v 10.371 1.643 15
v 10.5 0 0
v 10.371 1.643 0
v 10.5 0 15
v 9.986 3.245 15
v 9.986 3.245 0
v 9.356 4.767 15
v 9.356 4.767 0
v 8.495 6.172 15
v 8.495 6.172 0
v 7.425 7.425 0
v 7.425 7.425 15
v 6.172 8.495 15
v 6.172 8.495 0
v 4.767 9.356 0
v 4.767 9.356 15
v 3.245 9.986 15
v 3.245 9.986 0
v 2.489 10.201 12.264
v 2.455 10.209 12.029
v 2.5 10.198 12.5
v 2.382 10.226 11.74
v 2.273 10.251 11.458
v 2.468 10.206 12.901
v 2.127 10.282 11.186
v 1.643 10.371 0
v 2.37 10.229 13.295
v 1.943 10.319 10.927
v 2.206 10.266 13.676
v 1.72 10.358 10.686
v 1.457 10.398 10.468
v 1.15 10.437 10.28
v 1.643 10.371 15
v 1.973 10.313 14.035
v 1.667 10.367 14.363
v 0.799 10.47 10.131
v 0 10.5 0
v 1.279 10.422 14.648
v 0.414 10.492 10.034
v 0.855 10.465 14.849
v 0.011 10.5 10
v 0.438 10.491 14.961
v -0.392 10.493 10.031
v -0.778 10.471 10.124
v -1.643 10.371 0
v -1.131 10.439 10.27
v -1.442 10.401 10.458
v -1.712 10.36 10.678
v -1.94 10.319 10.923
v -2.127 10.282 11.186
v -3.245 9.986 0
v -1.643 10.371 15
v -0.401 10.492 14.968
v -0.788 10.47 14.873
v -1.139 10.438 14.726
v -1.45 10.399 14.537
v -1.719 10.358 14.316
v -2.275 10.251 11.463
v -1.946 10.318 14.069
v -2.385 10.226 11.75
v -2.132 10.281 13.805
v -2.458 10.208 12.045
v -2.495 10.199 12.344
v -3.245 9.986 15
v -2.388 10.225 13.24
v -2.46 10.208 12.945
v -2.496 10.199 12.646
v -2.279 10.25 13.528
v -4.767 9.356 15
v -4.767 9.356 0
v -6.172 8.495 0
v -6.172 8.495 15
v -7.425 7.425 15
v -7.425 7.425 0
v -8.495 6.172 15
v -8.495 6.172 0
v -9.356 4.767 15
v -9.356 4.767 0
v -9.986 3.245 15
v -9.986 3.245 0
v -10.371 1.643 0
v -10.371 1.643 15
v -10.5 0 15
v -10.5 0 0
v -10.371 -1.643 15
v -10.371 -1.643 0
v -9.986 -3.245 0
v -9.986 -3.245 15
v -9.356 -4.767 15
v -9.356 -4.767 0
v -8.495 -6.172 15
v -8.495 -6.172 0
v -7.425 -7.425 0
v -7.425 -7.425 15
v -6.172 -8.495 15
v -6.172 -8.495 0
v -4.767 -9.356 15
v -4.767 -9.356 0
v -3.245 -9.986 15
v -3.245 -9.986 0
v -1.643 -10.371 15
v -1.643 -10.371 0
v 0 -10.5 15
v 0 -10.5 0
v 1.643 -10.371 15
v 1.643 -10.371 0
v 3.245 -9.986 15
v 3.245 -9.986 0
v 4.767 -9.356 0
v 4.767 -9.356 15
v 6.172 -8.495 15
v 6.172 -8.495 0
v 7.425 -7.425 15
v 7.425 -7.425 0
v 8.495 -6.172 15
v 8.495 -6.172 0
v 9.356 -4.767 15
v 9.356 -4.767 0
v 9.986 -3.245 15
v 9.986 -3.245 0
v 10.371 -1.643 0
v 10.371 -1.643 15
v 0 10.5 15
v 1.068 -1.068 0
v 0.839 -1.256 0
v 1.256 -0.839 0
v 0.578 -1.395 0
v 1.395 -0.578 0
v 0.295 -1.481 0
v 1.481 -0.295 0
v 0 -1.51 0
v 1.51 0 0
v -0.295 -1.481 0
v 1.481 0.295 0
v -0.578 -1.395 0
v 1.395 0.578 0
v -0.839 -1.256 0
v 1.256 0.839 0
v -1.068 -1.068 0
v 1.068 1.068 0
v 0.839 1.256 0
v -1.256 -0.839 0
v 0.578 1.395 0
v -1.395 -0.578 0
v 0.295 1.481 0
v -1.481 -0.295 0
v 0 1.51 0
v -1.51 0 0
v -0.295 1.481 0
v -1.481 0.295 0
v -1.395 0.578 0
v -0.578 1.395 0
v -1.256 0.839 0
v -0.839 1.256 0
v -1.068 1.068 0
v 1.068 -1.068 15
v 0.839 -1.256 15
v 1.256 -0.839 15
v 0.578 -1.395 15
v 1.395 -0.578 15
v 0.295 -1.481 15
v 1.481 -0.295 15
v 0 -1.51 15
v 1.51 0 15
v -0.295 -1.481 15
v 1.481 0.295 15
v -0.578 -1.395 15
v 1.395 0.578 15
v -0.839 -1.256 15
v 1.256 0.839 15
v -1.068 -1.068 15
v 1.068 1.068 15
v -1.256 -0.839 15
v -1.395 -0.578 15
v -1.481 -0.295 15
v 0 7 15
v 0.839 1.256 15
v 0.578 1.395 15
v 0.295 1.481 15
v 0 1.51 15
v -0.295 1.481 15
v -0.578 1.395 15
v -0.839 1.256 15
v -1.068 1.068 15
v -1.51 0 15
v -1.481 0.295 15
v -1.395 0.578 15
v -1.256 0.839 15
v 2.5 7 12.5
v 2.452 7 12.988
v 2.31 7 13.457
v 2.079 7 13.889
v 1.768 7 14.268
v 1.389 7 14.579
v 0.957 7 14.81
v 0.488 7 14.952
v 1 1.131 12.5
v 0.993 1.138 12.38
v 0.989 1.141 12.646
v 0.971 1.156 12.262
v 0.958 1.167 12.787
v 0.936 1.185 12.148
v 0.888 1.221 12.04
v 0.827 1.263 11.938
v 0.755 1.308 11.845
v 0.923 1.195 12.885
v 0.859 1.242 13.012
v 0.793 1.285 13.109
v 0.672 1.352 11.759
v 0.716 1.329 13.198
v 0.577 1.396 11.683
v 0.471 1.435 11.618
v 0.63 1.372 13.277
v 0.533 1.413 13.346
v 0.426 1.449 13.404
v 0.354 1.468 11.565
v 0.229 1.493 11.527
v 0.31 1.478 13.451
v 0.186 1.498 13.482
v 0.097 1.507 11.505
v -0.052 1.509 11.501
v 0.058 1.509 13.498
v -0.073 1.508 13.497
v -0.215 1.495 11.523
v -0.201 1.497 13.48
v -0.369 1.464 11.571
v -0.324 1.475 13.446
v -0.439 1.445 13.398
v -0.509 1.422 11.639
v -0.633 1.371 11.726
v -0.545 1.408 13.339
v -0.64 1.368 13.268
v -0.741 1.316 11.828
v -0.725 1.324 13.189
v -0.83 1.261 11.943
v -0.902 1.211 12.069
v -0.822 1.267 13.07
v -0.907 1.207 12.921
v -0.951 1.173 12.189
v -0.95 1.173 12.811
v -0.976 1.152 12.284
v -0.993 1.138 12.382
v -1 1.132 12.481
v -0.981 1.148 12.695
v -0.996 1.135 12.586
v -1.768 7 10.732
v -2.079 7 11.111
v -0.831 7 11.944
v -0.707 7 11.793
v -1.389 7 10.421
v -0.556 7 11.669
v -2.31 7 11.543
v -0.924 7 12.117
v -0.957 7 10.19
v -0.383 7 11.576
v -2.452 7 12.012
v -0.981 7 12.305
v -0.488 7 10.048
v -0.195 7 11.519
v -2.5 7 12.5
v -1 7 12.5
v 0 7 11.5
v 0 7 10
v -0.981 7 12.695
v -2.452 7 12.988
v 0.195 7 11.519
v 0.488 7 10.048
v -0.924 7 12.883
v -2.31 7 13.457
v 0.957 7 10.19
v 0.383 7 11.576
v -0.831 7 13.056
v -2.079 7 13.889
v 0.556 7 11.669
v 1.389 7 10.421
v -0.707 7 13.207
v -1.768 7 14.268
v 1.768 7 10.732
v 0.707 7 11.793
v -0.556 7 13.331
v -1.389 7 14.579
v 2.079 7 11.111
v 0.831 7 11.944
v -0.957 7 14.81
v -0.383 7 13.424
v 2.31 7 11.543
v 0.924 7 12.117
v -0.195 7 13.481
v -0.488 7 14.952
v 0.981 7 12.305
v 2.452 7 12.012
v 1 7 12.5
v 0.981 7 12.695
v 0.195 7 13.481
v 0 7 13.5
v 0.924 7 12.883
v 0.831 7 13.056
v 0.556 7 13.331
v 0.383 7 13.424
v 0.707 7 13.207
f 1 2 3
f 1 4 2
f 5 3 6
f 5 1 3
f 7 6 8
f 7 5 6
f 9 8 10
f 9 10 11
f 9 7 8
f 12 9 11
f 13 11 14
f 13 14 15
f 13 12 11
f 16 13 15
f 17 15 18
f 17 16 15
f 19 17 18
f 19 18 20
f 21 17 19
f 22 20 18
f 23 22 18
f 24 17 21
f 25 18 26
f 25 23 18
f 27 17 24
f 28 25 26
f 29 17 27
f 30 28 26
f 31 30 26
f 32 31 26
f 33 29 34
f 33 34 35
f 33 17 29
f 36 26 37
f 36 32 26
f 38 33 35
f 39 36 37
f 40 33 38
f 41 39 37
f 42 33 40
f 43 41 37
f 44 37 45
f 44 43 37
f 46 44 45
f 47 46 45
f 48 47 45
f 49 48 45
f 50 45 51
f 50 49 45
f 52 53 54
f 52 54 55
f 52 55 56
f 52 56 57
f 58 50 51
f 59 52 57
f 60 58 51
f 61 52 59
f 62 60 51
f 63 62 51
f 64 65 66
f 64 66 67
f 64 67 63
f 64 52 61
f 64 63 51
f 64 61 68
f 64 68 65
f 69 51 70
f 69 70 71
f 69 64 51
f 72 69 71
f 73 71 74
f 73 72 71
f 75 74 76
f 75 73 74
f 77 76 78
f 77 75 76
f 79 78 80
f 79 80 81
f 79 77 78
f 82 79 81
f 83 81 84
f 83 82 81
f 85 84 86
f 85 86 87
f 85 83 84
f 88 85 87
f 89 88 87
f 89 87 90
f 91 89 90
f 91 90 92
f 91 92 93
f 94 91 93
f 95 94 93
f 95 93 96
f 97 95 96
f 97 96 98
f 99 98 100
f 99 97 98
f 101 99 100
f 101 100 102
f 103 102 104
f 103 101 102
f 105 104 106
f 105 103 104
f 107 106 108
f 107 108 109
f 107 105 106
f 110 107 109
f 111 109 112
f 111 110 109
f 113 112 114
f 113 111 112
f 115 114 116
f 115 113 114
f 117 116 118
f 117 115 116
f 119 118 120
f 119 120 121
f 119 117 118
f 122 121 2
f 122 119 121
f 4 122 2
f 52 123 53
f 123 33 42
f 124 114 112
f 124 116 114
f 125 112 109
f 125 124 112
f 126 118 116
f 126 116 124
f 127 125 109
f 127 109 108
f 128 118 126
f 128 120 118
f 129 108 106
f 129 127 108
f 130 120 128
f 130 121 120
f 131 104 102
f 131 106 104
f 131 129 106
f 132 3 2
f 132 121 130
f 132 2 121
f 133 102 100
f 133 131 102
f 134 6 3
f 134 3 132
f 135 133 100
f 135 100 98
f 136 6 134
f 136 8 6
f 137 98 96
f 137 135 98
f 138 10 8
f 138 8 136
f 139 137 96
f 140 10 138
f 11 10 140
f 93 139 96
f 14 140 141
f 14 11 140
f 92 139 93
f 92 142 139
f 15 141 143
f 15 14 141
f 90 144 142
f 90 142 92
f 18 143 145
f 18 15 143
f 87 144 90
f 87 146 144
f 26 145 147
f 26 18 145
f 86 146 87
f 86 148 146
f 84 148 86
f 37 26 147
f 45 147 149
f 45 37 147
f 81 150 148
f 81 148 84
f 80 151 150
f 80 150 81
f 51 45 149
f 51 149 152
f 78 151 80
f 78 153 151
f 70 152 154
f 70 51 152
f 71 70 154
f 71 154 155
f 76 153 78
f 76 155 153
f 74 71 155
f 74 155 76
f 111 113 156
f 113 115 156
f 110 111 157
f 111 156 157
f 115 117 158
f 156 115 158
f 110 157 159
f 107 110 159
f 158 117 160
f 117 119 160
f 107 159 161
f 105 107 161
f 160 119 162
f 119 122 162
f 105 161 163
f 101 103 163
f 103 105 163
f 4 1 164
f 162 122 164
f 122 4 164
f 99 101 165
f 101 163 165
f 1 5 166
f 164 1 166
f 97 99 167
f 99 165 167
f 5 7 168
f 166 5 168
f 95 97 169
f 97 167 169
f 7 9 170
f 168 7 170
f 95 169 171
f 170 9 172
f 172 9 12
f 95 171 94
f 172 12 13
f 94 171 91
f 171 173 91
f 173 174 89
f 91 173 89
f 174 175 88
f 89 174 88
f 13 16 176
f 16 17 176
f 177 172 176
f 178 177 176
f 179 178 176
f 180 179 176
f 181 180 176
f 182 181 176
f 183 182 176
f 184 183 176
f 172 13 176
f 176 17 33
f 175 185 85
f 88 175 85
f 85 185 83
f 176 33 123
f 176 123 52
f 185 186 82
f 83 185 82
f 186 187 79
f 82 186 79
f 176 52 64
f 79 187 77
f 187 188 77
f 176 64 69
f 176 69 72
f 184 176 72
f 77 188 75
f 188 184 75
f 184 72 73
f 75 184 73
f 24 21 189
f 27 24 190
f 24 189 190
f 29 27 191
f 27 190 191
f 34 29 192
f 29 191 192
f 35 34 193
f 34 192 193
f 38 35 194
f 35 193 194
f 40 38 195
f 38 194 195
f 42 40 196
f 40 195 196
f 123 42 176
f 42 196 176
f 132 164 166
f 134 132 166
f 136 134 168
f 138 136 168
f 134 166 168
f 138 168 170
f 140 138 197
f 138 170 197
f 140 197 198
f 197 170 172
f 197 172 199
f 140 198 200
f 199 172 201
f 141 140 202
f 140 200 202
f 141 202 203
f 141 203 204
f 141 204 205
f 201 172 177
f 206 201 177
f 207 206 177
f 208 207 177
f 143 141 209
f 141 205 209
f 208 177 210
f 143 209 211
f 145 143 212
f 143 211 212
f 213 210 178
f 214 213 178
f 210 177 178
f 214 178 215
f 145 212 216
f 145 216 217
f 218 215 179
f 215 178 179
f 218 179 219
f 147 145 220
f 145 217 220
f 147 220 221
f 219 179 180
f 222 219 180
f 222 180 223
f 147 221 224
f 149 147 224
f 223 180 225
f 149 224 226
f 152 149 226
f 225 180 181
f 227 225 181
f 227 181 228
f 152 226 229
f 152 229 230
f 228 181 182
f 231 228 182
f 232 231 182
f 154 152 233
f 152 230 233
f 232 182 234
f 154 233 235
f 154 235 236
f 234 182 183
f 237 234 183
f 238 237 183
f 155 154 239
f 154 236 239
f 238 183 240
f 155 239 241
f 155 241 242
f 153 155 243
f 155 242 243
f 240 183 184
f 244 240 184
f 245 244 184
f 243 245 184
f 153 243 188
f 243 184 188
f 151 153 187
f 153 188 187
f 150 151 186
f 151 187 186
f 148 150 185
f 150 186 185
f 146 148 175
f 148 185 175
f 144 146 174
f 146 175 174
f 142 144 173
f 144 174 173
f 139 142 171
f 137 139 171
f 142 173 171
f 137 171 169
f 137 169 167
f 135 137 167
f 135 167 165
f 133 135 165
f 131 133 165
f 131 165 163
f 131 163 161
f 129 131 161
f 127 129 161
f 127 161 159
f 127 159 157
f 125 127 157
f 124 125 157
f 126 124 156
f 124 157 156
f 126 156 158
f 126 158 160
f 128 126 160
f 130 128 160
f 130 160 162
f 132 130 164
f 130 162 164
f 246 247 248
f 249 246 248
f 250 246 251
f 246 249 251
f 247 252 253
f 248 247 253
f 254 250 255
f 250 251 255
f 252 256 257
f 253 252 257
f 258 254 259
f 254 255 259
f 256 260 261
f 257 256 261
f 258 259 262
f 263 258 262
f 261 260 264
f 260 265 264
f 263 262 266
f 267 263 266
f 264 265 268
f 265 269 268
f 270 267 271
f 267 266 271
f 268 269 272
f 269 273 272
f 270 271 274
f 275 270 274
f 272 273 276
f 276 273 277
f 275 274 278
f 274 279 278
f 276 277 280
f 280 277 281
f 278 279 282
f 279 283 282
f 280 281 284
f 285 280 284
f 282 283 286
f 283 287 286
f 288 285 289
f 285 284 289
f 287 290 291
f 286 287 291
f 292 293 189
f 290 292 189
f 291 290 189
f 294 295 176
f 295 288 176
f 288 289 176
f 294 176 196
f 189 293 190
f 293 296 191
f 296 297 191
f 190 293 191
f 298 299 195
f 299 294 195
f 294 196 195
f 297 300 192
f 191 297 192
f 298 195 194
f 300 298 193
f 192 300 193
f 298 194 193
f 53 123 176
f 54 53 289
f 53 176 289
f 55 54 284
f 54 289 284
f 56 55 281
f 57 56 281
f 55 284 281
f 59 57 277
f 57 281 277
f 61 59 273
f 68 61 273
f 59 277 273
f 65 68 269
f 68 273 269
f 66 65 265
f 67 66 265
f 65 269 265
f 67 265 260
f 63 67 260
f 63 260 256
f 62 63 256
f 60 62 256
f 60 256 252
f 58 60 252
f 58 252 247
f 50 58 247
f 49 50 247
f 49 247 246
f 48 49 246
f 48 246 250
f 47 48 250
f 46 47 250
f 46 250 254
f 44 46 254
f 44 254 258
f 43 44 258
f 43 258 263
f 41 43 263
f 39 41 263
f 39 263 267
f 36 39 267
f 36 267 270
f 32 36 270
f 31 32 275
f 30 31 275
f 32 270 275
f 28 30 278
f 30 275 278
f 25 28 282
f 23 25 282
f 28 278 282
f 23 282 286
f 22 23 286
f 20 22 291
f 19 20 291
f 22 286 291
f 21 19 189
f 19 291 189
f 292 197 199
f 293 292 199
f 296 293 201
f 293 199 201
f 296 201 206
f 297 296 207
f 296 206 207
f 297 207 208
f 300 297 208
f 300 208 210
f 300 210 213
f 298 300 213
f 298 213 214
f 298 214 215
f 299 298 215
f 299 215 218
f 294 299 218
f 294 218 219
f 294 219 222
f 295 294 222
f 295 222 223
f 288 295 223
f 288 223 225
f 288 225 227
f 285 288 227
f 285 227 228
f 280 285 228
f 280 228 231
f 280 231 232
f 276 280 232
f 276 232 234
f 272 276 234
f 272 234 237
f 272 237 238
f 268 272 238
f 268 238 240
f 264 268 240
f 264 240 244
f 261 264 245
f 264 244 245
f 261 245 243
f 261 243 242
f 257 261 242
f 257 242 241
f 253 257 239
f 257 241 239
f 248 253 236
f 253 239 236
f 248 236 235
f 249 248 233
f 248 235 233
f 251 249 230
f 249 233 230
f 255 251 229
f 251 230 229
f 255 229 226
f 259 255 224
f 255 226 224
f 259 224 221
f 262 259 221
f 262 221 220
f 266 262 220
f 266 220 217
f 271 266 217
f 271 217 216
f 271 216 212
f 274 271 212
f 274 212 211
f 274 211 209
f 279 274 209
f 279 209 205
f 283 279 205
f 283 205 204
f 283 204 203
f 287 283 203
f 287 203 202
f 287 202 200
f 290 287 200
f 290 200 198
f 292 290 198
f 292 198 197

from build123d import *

# Parameters (mm, degrees)
SKETCH_W        = 8.99
SKETCH_H        = 15
SKETCH001_R     = 1
POCKET_DEPTH    = 26
POCKET001_START = -7
SKETCH002_R     = 2.5
POCKET001_DEPTH = 28


with BuildPart() as part:
    # Sketch → Revolution (revolve)
    with BuildSketch(Plane.XZ):
        with Locations((6.005, 7.5)):
            Rectangle(SKETCH_W, SKETCH_H)
    revolve(axis=Axis((0, 0, 0), (0, 0, 1)))

    # Sketch001 → Pocket (cut)
    with BuildSketch(Plane.XZ):
        with Locations((0, 12.5)):
            Circle(SKETCH001_R)
    extrude(amount=-POCKET_DEPTH, mode=Mode.SUBTRACT)

    # Sketch002 → Pocket001 (cut)
    with BuildSketch(Plane.XZ.offset(POCKET001_START)):
        with Locations((0, 12.5)):
            Circle(SKETCH002_R)
    extrude(amount=-POCKET001_DEPTH, mode=Mode.SUBTRACT)


solid = part.part
